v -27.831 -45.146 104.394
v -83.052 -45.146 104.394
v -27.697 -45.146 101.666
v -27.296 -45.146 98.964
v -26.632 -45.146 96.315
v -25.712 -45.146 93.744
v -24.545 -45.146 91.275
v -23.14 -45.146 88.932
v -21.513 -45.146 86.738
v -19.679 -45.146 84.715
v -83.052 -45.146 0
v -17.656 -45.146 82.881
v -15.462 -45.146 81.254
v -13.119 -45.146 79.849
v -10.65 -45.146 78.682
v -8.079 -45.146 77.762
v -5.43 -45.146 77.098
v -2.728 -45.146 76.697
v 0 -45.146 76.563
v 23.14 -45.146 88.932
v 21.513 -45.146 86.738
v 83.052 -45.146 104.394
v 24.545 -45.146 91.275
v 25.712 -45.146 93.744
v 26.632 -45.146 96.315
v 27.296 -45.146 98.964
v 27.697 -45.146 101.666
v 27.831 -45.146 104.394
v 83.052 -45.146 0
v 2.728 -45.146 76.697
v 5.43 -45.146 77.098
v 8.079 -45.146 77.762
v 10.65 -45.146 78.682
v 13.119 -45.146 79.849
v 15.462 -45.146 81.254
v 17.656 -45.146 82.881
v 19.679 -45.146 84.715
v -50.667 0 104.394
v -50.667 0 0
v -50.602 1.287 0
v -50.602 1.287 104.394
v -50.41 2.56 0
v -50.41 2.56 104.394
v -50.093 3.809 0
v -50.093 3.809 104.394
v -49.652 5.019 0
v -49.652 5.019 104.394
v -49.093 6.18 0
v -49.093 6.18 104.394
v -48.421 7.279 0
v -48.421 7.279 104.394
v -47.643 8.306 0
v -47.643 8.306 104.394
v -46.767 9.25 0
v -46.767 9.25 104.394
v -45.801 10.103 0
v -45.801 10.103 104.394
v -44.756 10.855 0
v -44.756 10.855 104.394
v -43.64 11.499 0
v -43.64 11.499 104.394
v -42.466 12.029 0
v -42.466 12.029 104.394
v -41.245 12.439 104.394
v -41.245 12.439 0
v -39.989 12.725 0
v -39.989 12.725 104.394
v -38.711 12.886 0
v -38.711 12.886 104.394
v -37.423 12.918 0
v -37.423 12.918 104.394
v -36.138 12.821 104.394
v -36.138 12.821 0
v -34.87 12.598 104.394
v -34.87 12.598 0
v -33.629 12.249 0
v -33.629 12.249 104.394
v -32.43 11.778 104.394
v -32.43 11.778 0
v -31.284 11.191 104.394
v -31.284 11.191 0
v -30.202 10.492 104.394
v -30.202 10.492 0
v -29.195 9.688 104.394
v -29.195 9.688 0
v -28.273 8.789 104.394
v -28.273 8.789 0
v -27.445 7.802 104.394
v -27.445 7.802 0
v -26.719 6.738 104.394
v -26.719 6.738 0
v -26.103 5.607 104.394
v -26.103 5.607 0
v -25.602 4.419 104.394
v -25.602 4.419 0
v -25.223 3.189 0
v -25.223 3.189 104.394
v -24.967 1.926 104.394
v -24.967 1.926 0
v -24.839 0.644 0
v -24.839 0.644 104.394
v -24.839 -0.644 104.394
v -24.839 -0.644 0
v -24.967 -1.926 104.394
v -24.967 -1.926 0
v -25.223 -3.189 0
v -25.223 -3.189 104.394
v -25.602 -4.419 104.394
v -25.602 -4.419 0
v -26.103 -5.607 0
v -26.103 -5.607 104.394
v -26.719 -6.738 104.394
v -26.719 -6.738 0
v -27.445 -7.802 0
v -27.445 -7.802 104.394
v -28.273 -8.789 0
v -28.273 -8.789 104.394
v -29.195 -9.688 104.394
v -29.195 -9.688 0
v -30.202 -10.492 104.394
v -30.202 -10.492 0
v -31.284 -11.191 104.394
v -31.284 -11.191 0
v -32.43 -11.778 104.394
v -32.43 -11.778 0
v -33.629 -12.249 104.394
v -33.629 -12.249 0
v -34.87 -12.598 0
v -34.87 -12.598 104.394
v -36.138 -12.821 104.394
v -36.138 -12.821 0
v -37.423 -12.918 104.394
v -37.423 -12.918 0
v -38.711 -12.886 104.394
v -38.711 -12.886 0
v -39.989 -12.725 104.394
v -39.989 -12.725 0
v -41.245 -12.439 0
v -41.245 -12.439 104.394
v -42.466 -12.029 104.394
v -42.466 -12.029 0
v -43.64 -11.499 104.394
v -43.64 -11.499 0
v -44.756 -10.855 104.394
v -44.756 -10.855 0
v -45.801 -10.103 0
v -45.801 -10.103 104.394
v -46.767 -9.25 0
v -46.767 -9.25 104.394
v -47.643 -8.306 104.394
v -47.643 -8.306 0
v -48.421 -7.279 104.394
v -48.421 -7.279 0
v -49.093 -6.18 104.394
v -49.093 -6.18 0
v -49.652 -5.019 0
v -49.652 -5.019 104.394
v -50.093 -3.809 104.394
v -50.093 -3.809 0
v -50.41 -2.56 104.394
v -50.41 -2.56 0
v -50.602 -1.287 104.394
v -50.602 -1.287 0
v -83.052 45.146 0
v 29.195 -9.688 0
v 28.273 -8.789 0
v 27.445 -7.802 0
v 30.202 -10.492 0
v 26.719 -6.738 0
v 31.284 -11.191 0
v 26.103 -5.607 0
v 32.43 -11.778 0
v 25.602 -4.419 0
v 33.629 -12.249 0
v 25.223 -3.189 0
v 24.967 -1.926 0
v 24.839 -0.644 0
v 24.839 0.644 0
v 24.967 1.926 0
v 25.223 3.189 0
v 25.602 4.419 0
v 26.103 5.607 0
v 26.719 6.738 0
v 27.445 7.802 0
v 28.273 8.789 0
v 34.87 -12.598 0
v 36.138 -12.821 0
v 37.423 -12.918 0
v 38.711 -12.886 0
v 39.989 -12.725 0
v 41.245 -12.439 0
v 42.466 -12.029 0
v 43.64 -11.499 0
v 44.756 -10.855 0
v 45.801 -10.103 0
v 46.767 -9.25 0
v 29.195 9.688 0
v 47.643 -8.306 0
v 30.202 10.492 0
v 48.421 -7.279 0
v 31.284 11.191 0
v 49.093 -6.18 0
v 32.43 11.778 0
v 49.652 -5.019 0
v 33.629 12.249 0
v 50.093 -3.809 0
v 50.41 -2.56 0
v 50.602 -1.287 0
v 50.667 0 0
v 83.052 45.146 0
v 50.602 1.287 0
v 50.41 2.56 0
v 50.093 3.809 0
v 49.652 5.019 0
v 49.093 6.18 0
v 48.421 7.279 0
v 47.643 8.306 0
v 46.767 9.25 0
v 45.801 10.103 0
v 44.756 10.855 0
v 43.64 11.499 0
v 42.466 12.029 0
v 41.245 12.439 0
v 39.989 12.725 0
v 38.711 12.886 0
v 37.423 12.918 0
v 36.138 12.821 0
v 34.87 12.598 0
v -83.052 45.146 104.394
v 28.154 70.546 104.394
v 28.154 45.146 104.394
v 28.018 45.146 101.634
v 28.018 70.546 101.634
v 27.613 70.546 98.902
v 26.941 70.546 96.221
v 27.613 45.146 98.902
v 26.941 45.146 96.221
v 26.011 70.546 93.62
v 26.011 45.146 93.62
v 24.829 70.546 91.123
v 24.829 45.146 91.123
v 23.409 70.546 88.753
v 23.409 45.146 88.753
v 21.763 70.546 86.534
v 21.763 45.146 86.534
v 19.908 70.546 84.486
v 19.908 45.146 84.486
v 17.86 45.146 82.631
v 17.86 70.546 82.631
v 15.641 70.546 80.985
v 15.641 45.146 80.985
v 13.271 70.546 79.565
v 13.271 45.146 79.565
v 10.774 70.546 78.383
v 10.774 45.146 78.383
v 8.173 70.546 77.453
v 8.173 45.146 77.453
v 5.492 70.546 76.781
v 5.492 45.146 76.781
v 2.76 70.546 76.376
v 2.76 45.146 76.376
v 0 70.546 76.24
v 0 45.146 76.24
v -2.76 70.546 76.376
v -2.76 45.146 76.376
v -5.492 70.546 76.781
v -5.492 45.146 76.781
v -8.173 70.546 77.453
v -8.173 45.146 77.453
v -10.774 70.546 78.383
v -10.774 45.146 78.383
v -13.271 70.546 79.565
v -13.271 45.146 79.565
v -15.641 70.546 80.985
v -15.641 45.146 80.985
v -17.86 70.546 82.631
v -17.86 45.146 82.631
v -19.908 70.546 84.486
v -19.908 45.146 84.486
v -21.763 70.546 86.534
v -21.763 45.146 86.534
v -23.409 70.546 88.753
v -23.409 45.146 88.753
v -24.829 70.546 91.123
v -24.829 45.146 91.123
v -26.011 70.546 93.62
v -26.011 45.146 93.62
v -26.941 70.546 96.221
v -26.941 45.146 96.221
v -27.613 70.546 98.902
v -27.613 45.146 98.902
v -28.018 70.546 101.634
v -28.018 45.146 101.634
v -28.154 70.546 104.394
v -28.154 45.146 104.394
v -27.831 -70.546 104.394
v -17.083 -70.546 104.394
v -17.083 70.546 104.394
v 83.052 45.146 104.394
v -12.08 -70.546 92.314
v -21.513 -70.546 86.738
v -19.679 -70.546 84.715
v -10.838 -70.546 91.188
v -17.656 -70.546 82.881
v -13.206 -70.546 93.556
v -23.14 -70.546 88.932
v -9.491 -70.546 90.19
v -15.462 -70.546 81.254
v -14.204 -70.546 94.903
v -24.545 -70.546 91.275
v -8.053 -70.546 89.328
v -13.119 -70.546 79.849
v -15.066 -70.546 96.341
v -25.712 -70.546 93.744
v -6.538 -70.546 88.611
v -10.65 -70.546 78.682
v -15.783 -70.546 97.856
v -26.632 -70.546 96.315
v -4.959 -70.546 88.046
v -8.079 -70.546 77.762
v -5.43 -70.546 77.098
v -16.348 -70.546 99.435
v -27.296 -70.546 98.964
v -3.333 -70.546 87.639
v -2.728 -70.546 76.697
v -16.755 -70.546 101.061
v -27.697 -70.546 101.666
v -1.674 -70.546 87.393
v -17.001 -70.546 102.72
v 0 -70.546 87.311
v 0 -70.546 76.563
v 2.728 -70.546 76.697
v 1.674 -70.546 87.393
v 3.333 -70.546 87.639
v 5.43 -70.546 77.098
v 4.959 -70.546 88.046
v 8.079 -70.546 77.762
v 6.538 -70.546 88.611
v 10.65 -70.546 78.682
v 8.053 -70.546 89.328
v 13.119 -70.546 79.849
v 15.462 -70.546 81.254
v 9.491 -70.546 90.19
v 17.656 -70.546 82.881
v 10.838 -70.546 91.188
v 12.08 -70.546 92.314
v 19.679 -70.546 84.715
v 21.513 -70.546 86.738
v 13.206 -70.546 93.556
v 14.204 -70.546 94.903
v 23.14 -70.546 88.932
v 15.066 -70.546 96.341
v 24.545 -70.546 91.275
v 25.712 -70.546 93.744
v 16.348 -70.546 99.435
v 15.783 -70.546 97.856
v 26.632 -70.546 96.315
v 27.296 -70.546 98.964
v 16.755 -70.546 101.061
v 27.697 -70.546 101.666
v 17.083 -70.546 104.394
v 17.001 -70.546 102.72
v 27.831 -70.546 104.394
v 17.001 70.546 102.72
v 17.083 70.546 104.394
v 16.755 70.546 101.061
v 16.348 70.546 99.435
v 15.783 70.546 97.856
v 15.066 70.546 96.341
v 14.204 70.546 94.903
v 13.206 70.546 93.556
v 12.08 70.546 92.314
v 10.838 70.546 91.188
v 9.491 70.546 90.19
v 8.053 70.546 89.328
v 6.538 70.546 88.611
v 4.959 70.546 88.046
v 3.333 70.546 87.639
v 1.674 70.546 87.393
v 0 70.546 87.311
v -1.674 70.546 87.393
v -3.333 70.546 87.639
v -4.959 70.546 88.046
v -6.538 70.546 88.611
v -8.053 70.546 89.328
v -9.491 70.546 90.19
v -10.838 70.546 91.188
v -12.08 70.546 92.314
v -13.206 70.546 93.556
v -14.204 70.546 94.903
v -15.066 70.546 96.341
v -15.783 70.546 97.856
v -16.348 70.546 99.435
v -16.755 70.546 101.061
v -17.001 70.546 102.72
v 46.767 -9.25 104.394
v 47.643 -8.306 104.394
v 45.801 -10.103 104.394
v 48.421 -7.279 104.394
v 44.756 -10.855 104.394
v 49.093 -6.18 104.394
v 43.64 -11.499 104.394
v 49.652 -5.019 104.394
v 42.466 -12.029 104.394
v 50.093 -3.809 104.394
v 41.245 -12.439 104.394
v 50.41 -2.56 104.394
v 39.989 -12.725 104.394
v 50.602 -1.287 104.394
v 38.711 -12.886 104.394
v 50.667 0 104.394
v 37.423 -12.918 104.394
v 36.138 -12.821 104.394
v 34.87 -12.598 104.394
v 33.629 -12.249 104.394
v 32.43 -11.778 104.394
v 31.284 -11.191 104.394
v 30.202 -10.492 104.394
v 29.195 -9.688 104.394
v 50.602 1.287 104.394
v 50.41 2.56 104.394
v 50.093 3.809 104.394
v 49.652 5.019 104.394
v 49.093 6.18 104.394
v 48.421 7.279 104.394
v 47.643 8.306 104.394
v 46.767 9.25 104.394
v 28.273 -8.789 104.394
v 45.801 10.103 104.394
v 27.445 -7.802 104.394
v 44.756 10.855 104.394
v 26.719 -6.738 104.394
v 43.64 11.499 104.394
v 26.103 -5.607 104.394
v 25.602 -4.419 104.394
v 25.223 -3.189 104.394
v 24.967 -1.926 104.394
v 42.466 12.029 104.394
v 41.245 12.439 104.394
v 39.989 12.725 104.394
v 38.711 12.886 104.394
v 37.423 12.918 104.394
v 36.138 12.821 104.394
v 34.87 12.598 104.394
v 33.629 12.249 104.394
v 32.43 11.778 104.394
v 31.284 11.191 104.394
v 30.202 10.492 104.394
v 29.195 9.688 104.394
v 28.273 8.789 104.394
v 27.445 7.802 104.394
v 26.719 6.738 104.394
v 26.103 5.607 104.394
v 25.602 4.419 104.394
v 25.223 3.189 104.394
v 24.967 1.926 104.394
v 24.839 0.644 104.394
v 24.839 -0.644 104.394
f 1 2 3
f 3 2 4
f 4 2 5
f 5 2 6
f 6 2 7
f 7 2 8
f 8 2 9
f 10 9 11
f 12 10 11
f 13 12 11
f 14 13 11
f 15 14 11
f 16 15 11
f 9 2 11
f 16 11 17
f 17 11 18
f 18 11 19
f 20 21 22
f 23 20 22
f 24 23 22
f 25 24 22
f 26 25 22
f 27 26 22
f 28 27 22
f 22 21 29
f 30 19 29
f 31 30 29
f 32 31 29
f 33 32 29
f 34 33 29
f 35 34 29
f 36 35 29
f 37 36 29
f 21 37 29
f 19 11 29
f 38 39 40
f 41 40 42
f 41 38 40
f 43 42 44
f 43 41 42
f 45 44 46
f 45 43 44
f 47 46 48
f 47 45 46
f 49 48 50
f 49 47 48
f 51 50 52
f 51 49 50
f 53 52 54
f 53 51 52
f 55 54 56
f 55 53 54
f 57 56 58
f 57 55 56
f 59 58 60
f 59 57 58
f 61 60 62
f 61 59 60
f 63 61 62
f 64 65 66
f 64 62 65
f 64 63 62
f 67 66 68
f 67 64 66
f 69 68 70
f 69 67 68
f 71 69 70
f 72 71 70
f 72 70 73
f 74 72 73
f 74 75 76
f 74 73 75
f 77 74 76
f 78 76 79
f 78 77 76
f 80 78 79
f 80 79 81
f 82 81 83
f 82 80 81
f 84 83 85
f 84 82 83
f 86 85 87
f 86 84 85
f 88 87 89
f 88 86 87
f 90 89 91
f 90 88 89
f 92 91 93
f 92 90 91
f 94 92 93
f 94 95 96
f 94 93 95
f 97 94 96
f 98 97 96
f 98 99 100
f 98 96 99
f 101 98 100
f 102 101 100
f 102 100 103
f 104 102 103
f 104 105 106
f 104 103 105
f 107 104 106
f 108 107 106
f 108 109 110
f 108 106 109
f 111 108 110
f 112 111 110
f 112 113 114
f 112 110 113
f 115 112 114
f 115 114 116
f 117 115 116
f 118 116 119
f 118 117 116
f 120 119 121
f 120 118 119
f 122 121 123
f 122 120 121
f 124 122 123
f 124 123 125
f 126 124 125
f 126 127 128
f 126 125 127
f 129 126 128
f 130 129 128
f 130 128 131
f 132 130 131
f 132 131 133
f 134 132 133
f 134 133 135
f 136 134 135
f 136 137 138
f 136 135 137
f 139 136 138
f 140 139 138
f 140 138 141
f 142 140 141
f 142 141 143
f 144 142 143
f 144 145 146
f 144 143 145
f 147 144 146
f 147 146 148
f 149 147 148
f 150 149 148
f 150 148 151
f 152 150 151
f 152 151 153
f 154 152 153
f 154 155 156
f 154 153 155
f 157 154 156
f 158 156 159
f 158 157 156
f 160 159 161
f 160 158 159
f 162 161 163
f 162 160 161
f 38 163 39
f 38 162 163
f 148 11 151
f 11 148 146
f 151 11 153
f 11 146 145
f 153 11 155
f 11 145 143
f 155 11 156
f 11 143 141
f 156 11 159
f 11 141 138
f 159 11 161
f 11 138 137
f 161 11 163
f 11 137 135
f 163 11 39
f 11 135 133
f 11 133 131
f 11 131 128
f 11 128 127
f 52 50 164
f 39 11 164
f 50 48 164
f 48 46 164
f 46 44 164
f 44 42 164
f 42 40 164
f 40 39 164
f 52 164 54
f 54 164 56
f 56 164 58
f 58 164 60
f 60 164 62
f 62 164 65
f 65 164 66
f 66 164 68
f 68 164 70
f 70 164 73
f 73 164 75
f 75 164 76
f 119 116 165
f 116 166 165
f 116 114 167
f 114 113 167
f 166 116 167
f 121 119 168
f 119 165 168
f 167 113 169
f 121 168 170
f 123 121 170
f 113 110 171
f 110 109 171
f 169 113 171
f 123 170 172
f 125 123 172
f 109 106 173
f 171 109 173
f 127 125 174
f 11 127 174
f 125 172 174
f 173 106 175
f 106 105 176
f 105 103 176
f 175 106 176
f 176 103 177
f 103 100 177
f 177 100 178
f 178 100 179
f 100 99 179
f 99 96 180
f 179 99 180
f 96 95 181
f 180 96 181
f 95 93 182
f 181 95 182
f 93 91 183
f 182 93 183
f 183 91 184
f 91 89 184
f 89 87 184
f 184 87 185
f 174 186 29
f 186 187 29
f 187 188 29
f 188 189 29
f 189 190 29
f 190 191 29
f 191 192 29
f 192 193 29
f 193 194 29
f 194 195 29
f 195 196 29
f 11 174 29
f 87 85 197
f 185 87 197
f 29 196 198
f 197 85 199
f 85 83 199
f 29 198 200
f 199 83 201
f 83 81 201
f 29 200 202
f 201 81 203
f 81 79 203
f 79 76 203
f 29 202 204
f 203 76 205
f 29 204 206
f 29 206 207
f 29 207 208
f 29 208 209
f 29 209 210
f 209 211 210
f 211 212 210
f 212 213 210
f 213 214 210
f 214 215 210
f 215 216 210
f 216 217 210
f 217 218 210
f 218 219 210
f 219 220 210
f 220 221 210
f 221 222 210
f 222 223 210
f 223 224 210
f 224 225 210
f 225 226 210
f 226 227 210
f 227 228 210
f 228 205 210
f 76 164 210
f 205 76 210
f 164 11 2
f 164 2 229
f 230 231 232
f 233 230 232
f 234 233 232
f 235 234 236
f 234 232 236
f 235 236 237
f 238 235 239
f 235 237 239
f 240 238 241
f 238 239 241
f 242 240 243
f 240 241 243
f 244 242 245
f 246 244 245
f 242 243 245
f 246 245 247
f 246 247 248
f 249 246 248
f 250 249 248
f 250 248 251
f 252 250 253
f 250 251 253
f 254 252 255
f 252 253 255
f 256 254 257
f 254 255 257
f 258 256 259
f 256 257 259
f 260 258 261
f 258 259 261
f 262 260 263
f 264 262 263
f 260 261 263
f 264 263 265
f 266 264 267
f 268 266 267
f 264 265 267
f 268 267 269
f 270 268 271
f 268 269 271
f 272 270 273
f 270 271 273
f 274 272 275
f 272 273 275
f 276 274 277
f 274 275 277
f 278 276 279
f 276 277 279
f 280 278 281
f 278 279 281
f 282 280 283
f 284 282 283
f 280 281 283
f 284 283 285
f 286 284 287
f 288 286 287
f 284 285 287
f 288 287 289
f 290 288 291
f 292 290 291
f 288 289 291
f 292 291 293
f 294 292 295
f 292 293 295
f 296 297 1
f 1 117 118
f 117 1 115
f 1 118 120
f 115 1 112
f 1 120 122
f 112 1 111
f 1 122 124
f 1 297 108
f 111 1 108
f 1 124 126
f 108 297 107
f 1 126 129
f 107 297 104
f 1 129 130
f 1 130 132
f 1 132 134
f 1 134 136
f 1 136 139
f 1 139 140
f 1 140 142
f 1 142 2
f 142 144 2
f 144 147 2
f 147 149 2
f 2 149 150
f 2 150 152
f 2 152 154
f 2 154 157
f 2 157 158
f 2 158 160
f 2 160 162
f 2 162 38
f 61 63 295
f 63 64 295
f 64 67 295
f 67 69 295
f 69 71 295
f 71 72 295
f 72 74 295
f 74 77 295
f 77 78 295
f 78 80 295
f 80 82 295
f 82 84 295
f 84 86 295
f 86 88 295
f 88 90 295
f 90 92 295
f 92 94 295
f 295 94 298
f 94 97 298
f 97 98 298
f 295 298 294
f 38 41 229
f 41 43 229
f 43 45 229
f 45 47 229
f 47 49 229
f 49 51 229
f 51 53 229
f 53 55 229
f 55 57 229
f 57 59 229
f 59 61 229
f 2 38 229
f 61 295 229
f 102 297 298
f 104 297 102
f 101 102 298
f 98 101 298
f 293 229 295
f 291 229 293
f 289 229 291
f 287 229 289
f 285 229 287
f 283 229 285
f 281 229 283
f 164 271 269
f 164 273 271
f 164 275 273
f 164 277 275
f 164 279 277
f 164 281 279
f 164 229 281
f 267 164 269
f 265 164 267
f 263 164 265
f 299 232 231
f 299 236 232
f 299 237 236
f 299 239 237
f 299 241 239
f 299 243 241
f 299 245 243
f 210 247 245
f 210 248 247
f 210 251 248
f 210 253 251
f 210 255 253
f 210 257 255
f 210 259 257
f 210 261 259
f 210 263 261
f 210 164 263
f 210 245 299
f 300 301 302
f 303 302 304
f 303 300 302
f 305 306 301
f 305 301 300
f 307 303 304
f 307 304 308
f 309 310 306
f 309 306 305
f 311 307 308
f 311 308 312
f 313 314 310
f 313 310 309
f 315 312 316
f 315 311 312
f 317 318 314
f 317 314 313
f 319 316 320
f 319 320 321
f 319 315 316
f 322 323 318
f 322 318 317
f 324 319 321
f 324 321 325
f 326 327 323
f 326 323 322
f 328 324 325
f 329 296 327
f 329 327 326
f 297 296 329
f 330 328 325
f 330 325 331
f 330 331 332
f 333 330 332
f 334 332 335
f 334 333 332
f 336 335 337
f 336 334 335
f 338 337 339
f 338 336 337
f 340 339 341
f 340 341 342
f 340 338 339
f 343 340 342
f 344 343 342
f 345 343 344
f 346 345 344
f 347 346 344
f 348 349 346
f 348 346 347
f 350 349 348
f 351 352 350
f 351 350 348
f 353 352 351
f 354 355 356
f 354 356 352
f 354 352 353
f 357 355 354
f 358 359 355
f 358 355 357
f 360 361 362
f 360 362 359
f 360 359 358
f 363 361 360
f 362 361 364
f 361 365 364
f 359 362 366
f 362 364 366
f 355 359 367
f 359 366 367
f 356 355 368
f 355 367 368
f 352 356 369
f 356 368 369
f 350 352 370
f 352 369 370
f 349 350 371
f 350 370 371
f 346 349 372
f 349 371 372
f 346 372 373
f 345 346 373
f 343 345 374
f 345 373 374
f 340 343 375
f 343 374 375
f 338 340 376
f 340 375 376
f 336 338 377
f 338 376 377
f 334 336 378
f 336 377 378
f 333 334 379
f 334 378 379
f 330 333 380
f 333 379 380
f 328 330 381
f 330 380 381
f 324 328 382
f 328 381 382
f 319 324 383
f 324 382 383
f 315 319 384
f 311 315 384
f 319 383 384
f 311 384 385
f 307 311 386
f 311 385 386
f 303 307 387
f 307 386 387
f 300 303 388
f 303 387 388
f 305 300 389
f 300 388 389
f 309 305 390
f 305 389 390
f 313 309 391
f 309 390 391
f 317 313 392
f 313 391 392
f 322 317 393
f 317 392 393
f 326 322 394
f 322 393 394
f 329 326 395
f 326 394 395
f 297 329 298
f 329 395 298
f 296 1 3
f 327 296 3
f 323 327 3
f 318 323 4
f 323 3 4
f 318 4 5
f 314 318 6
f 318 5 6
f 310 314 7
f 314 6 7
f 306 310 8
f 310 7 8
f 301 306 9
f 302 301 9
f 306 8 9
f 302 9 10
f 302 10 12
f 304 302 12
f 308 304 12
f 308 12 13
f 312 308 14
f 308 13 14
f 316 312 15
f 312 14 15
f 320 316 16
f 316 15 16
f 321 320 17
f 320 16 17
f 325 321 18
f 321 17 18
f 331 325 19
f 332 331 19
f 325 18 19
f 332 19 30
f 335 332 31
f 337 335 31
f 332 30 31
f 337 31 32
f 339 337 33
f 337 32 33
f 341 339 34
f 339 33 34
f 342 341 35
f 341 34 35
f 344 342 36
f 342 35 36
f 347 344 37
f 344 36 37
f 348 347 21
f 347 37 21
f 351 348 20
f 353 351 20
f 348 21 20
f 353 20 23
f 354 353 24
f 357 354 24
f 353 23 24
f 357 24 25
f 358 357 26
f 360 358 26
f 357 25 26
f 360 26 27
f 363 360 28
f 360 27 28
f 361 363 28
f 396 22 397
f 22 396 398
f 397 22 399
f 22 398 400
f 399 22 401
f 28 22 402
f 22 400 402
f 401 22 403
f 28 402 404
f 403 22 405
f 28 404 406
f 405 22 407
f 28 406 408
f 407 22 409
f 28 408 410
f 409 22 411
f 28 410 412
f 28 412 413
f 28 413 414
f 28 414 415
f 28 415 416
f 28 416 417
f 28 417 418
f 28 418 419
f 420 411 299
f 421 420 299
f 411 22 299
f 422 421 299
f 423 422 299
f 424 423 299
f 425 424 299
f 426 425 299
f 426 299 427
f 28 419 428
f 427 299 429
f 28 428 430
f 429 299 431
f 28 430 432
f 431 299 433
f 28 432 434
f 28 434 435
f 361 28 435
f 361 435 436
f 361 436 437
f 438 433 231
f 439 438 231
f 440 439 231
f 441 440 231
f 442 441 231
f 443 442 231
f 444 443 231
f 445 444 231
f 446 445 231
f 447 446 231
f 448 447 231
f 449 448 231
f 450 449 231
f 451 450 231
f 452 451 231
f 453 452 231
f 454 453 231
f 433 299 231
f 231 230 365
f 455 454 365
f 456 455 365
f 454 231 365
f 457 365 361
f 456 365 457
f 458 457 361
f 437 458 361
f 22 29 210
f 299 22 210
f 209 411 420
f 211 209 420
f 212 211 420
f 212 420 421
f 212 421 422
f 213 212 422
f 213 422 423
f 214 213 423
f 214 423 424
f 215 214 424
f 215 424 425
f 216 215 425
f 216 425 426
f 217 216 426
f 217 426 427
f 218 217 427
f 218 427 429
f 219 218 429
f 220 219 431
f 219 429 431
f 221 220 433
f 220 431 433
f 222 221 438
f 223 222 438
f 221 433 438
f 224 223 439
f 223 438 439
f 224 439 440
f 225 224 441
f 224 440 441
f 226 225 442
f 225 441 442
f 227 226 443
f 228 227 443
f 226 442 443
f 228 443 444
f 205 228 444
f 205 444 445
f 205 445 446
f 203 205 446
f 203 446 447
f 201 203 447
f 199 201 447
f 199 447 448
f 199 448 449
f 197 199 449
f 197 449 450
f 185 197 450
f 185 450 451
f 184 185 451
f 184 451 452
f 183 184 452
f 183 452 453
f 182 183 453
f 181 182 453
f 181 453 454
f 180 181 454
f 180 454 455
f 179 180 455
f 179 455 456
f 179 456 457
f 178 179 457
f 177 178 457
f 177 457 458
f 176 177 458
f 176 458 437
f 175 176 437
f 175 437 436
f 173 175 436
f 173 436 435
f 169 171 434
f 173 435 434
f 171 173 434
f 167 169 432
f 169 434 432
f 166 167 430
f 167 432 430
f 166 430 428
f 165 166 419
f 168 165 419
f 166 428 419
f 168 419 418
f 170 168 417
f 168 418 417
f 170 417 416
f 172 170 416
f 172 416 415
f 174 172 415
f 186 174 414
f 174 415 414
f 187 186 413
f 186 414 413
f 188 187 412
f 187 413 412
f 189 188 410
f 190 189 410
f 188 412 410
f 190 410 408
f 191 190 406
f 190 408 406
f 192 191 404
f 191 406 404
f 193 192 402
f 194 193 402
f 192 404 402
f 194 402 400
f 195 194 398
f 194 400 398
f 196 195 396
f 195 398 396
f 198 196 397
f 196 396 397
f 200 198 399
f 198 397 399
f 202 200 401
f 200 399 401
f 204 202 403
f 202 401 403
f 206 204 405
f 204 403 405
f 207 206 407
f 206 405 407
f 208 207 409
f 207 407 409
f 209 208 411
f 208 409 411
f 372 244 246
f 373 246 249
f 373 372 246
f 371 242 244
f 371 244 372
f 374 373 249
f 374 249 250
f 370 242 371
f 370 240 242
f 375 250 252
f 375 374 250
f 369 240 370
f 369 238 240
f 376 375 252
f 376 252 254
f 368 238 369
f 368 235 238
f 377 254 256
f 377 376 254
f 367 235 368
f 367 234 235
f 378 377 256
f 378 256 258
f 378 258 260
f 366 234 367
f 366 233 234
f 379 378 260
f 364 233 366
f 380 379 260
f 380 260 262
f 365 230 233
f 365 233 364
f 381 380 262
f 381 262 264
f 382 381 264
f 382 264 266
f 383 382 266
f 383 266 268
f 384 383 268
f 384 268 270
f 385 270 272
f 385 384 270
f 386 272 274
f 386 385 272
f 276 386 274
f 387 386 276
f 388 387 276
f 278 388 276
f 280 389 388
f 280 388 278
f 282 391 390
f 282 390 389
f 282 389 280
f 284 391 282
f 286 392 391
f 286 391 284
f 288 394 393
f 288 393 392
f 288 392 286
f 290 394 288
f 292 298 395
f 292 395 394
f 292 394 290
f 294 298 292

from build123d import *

# Parameters (mm, degrees)
F0_W       = 166.1031842232
F0_H       = 90.2919918299
F1_DEPTH   = 104.394
F1_FACE1_W = 166.1031842232
F1_FACE1_H = 104.394
F3_DEPTH   = 25.4
F5_DEPTH   = 306.324
F7_DEPTH   = 25.4
F8_R       = 12.9217505793
F9_DEPTH   = 104.395


# Not quite as in the source:
# - a pattern or mirror of a feature is missing from the dataset's text; its kind, count and spacing are read off the source's solid


with BuildPart() as f1:
    # F0 (on Top) → F1 (new body)
    with BuildSketch(Plane.XY):
        Rectangle(F0_W, F0_H)
    extrude(amount=F1_DEPTH)

    # F2 (on face) + F1_face1 (on face) → F3 (join)
    with BuildSketch(Plane(origin=(0, 45.1459959149, 0), x_dir=(-1, 0, 0), z_dir=(0, 1, 0))):
        with BuildLine():
            Line((28.1535676802, 104.394), (17.0834749636, 104.394))
            ThreePointArc((17.0834749636, 104.394), (0, 87.3105250364), (-17.0834749636, 104.394))
            Line((-17.0834749636, 104.394), (-28.1535676802, 104.394))
            ThreePointArc((-28.1535676802, 104.394), (0, 76.2404323198), (28.1535676802, 104.394))
        make_face()
    with BuildSketch(Plane(origin=(0, -45.1459959149, 52.197), x_dir=(1, 0, 0), z_dir=(0, -1, 0))):
        Rectangle(F1_FACE1_W, F1_FACE1_H)
    extrude(amount=F3_DEPTH, dir=(0, 1, 0))

    # F4 (on face) → F5 (cut)
    with BuildSketch(Plane(origin=(0, 45.1459959149, 0), x_dir=(-1, 0, 0), z_dir=(0, 1, 0))):
        with BuildLine():
            Line((17.0834749636, 104.394), (-17.0834749636, 104.394))
            ThreePointArc((-17.0834749636, 104.394), (0, 87.3105250364), (17.0834749636, 104.394))
        make_face()
    extrude(amount=-F5_DEPTH, mode=Mode.SUBTRACT)

    # F6 (on face) → F7 (join)
    with BuildSketch(Plane.XZ.offset(45.1459959149)):
        with BuildLine():
            ThreePointArc((-27.8307711085, 104.394), (0, 76.5632288915), (27.8307711085, 104.394))
            Line((27.8307711085, 104.394), (17.0834749636, 104.394))
            ThreePointArc((17.0834749636, 104.394), (0, 87.3105250364), (-17.0834749636, 104.394))
            Line((-17.0834749636, 104.394), (-27.8307711085, 104.394))
        make_face()
    extrude(amount=F7_DEPTH)

    # F8 (on face) → F9 (cut, through all)
    with BuildSketch(Plane.XY.offset(104.394)):
        with Locations((37.7448610961, 0)):
            Circle(F8_R)
    f9 = extrude(amount=-F9_DEPTH, mode=Mode.SUBTRACT)

    # F9_copies: F9 across plane
    add(f9.mirror(Plane(origin=(0, 0, 0), x_dir=(0, 0, -1), z_dir=(-1, 0, 0))), mode=Mode.SUBTRACT)


solid = f1.part
